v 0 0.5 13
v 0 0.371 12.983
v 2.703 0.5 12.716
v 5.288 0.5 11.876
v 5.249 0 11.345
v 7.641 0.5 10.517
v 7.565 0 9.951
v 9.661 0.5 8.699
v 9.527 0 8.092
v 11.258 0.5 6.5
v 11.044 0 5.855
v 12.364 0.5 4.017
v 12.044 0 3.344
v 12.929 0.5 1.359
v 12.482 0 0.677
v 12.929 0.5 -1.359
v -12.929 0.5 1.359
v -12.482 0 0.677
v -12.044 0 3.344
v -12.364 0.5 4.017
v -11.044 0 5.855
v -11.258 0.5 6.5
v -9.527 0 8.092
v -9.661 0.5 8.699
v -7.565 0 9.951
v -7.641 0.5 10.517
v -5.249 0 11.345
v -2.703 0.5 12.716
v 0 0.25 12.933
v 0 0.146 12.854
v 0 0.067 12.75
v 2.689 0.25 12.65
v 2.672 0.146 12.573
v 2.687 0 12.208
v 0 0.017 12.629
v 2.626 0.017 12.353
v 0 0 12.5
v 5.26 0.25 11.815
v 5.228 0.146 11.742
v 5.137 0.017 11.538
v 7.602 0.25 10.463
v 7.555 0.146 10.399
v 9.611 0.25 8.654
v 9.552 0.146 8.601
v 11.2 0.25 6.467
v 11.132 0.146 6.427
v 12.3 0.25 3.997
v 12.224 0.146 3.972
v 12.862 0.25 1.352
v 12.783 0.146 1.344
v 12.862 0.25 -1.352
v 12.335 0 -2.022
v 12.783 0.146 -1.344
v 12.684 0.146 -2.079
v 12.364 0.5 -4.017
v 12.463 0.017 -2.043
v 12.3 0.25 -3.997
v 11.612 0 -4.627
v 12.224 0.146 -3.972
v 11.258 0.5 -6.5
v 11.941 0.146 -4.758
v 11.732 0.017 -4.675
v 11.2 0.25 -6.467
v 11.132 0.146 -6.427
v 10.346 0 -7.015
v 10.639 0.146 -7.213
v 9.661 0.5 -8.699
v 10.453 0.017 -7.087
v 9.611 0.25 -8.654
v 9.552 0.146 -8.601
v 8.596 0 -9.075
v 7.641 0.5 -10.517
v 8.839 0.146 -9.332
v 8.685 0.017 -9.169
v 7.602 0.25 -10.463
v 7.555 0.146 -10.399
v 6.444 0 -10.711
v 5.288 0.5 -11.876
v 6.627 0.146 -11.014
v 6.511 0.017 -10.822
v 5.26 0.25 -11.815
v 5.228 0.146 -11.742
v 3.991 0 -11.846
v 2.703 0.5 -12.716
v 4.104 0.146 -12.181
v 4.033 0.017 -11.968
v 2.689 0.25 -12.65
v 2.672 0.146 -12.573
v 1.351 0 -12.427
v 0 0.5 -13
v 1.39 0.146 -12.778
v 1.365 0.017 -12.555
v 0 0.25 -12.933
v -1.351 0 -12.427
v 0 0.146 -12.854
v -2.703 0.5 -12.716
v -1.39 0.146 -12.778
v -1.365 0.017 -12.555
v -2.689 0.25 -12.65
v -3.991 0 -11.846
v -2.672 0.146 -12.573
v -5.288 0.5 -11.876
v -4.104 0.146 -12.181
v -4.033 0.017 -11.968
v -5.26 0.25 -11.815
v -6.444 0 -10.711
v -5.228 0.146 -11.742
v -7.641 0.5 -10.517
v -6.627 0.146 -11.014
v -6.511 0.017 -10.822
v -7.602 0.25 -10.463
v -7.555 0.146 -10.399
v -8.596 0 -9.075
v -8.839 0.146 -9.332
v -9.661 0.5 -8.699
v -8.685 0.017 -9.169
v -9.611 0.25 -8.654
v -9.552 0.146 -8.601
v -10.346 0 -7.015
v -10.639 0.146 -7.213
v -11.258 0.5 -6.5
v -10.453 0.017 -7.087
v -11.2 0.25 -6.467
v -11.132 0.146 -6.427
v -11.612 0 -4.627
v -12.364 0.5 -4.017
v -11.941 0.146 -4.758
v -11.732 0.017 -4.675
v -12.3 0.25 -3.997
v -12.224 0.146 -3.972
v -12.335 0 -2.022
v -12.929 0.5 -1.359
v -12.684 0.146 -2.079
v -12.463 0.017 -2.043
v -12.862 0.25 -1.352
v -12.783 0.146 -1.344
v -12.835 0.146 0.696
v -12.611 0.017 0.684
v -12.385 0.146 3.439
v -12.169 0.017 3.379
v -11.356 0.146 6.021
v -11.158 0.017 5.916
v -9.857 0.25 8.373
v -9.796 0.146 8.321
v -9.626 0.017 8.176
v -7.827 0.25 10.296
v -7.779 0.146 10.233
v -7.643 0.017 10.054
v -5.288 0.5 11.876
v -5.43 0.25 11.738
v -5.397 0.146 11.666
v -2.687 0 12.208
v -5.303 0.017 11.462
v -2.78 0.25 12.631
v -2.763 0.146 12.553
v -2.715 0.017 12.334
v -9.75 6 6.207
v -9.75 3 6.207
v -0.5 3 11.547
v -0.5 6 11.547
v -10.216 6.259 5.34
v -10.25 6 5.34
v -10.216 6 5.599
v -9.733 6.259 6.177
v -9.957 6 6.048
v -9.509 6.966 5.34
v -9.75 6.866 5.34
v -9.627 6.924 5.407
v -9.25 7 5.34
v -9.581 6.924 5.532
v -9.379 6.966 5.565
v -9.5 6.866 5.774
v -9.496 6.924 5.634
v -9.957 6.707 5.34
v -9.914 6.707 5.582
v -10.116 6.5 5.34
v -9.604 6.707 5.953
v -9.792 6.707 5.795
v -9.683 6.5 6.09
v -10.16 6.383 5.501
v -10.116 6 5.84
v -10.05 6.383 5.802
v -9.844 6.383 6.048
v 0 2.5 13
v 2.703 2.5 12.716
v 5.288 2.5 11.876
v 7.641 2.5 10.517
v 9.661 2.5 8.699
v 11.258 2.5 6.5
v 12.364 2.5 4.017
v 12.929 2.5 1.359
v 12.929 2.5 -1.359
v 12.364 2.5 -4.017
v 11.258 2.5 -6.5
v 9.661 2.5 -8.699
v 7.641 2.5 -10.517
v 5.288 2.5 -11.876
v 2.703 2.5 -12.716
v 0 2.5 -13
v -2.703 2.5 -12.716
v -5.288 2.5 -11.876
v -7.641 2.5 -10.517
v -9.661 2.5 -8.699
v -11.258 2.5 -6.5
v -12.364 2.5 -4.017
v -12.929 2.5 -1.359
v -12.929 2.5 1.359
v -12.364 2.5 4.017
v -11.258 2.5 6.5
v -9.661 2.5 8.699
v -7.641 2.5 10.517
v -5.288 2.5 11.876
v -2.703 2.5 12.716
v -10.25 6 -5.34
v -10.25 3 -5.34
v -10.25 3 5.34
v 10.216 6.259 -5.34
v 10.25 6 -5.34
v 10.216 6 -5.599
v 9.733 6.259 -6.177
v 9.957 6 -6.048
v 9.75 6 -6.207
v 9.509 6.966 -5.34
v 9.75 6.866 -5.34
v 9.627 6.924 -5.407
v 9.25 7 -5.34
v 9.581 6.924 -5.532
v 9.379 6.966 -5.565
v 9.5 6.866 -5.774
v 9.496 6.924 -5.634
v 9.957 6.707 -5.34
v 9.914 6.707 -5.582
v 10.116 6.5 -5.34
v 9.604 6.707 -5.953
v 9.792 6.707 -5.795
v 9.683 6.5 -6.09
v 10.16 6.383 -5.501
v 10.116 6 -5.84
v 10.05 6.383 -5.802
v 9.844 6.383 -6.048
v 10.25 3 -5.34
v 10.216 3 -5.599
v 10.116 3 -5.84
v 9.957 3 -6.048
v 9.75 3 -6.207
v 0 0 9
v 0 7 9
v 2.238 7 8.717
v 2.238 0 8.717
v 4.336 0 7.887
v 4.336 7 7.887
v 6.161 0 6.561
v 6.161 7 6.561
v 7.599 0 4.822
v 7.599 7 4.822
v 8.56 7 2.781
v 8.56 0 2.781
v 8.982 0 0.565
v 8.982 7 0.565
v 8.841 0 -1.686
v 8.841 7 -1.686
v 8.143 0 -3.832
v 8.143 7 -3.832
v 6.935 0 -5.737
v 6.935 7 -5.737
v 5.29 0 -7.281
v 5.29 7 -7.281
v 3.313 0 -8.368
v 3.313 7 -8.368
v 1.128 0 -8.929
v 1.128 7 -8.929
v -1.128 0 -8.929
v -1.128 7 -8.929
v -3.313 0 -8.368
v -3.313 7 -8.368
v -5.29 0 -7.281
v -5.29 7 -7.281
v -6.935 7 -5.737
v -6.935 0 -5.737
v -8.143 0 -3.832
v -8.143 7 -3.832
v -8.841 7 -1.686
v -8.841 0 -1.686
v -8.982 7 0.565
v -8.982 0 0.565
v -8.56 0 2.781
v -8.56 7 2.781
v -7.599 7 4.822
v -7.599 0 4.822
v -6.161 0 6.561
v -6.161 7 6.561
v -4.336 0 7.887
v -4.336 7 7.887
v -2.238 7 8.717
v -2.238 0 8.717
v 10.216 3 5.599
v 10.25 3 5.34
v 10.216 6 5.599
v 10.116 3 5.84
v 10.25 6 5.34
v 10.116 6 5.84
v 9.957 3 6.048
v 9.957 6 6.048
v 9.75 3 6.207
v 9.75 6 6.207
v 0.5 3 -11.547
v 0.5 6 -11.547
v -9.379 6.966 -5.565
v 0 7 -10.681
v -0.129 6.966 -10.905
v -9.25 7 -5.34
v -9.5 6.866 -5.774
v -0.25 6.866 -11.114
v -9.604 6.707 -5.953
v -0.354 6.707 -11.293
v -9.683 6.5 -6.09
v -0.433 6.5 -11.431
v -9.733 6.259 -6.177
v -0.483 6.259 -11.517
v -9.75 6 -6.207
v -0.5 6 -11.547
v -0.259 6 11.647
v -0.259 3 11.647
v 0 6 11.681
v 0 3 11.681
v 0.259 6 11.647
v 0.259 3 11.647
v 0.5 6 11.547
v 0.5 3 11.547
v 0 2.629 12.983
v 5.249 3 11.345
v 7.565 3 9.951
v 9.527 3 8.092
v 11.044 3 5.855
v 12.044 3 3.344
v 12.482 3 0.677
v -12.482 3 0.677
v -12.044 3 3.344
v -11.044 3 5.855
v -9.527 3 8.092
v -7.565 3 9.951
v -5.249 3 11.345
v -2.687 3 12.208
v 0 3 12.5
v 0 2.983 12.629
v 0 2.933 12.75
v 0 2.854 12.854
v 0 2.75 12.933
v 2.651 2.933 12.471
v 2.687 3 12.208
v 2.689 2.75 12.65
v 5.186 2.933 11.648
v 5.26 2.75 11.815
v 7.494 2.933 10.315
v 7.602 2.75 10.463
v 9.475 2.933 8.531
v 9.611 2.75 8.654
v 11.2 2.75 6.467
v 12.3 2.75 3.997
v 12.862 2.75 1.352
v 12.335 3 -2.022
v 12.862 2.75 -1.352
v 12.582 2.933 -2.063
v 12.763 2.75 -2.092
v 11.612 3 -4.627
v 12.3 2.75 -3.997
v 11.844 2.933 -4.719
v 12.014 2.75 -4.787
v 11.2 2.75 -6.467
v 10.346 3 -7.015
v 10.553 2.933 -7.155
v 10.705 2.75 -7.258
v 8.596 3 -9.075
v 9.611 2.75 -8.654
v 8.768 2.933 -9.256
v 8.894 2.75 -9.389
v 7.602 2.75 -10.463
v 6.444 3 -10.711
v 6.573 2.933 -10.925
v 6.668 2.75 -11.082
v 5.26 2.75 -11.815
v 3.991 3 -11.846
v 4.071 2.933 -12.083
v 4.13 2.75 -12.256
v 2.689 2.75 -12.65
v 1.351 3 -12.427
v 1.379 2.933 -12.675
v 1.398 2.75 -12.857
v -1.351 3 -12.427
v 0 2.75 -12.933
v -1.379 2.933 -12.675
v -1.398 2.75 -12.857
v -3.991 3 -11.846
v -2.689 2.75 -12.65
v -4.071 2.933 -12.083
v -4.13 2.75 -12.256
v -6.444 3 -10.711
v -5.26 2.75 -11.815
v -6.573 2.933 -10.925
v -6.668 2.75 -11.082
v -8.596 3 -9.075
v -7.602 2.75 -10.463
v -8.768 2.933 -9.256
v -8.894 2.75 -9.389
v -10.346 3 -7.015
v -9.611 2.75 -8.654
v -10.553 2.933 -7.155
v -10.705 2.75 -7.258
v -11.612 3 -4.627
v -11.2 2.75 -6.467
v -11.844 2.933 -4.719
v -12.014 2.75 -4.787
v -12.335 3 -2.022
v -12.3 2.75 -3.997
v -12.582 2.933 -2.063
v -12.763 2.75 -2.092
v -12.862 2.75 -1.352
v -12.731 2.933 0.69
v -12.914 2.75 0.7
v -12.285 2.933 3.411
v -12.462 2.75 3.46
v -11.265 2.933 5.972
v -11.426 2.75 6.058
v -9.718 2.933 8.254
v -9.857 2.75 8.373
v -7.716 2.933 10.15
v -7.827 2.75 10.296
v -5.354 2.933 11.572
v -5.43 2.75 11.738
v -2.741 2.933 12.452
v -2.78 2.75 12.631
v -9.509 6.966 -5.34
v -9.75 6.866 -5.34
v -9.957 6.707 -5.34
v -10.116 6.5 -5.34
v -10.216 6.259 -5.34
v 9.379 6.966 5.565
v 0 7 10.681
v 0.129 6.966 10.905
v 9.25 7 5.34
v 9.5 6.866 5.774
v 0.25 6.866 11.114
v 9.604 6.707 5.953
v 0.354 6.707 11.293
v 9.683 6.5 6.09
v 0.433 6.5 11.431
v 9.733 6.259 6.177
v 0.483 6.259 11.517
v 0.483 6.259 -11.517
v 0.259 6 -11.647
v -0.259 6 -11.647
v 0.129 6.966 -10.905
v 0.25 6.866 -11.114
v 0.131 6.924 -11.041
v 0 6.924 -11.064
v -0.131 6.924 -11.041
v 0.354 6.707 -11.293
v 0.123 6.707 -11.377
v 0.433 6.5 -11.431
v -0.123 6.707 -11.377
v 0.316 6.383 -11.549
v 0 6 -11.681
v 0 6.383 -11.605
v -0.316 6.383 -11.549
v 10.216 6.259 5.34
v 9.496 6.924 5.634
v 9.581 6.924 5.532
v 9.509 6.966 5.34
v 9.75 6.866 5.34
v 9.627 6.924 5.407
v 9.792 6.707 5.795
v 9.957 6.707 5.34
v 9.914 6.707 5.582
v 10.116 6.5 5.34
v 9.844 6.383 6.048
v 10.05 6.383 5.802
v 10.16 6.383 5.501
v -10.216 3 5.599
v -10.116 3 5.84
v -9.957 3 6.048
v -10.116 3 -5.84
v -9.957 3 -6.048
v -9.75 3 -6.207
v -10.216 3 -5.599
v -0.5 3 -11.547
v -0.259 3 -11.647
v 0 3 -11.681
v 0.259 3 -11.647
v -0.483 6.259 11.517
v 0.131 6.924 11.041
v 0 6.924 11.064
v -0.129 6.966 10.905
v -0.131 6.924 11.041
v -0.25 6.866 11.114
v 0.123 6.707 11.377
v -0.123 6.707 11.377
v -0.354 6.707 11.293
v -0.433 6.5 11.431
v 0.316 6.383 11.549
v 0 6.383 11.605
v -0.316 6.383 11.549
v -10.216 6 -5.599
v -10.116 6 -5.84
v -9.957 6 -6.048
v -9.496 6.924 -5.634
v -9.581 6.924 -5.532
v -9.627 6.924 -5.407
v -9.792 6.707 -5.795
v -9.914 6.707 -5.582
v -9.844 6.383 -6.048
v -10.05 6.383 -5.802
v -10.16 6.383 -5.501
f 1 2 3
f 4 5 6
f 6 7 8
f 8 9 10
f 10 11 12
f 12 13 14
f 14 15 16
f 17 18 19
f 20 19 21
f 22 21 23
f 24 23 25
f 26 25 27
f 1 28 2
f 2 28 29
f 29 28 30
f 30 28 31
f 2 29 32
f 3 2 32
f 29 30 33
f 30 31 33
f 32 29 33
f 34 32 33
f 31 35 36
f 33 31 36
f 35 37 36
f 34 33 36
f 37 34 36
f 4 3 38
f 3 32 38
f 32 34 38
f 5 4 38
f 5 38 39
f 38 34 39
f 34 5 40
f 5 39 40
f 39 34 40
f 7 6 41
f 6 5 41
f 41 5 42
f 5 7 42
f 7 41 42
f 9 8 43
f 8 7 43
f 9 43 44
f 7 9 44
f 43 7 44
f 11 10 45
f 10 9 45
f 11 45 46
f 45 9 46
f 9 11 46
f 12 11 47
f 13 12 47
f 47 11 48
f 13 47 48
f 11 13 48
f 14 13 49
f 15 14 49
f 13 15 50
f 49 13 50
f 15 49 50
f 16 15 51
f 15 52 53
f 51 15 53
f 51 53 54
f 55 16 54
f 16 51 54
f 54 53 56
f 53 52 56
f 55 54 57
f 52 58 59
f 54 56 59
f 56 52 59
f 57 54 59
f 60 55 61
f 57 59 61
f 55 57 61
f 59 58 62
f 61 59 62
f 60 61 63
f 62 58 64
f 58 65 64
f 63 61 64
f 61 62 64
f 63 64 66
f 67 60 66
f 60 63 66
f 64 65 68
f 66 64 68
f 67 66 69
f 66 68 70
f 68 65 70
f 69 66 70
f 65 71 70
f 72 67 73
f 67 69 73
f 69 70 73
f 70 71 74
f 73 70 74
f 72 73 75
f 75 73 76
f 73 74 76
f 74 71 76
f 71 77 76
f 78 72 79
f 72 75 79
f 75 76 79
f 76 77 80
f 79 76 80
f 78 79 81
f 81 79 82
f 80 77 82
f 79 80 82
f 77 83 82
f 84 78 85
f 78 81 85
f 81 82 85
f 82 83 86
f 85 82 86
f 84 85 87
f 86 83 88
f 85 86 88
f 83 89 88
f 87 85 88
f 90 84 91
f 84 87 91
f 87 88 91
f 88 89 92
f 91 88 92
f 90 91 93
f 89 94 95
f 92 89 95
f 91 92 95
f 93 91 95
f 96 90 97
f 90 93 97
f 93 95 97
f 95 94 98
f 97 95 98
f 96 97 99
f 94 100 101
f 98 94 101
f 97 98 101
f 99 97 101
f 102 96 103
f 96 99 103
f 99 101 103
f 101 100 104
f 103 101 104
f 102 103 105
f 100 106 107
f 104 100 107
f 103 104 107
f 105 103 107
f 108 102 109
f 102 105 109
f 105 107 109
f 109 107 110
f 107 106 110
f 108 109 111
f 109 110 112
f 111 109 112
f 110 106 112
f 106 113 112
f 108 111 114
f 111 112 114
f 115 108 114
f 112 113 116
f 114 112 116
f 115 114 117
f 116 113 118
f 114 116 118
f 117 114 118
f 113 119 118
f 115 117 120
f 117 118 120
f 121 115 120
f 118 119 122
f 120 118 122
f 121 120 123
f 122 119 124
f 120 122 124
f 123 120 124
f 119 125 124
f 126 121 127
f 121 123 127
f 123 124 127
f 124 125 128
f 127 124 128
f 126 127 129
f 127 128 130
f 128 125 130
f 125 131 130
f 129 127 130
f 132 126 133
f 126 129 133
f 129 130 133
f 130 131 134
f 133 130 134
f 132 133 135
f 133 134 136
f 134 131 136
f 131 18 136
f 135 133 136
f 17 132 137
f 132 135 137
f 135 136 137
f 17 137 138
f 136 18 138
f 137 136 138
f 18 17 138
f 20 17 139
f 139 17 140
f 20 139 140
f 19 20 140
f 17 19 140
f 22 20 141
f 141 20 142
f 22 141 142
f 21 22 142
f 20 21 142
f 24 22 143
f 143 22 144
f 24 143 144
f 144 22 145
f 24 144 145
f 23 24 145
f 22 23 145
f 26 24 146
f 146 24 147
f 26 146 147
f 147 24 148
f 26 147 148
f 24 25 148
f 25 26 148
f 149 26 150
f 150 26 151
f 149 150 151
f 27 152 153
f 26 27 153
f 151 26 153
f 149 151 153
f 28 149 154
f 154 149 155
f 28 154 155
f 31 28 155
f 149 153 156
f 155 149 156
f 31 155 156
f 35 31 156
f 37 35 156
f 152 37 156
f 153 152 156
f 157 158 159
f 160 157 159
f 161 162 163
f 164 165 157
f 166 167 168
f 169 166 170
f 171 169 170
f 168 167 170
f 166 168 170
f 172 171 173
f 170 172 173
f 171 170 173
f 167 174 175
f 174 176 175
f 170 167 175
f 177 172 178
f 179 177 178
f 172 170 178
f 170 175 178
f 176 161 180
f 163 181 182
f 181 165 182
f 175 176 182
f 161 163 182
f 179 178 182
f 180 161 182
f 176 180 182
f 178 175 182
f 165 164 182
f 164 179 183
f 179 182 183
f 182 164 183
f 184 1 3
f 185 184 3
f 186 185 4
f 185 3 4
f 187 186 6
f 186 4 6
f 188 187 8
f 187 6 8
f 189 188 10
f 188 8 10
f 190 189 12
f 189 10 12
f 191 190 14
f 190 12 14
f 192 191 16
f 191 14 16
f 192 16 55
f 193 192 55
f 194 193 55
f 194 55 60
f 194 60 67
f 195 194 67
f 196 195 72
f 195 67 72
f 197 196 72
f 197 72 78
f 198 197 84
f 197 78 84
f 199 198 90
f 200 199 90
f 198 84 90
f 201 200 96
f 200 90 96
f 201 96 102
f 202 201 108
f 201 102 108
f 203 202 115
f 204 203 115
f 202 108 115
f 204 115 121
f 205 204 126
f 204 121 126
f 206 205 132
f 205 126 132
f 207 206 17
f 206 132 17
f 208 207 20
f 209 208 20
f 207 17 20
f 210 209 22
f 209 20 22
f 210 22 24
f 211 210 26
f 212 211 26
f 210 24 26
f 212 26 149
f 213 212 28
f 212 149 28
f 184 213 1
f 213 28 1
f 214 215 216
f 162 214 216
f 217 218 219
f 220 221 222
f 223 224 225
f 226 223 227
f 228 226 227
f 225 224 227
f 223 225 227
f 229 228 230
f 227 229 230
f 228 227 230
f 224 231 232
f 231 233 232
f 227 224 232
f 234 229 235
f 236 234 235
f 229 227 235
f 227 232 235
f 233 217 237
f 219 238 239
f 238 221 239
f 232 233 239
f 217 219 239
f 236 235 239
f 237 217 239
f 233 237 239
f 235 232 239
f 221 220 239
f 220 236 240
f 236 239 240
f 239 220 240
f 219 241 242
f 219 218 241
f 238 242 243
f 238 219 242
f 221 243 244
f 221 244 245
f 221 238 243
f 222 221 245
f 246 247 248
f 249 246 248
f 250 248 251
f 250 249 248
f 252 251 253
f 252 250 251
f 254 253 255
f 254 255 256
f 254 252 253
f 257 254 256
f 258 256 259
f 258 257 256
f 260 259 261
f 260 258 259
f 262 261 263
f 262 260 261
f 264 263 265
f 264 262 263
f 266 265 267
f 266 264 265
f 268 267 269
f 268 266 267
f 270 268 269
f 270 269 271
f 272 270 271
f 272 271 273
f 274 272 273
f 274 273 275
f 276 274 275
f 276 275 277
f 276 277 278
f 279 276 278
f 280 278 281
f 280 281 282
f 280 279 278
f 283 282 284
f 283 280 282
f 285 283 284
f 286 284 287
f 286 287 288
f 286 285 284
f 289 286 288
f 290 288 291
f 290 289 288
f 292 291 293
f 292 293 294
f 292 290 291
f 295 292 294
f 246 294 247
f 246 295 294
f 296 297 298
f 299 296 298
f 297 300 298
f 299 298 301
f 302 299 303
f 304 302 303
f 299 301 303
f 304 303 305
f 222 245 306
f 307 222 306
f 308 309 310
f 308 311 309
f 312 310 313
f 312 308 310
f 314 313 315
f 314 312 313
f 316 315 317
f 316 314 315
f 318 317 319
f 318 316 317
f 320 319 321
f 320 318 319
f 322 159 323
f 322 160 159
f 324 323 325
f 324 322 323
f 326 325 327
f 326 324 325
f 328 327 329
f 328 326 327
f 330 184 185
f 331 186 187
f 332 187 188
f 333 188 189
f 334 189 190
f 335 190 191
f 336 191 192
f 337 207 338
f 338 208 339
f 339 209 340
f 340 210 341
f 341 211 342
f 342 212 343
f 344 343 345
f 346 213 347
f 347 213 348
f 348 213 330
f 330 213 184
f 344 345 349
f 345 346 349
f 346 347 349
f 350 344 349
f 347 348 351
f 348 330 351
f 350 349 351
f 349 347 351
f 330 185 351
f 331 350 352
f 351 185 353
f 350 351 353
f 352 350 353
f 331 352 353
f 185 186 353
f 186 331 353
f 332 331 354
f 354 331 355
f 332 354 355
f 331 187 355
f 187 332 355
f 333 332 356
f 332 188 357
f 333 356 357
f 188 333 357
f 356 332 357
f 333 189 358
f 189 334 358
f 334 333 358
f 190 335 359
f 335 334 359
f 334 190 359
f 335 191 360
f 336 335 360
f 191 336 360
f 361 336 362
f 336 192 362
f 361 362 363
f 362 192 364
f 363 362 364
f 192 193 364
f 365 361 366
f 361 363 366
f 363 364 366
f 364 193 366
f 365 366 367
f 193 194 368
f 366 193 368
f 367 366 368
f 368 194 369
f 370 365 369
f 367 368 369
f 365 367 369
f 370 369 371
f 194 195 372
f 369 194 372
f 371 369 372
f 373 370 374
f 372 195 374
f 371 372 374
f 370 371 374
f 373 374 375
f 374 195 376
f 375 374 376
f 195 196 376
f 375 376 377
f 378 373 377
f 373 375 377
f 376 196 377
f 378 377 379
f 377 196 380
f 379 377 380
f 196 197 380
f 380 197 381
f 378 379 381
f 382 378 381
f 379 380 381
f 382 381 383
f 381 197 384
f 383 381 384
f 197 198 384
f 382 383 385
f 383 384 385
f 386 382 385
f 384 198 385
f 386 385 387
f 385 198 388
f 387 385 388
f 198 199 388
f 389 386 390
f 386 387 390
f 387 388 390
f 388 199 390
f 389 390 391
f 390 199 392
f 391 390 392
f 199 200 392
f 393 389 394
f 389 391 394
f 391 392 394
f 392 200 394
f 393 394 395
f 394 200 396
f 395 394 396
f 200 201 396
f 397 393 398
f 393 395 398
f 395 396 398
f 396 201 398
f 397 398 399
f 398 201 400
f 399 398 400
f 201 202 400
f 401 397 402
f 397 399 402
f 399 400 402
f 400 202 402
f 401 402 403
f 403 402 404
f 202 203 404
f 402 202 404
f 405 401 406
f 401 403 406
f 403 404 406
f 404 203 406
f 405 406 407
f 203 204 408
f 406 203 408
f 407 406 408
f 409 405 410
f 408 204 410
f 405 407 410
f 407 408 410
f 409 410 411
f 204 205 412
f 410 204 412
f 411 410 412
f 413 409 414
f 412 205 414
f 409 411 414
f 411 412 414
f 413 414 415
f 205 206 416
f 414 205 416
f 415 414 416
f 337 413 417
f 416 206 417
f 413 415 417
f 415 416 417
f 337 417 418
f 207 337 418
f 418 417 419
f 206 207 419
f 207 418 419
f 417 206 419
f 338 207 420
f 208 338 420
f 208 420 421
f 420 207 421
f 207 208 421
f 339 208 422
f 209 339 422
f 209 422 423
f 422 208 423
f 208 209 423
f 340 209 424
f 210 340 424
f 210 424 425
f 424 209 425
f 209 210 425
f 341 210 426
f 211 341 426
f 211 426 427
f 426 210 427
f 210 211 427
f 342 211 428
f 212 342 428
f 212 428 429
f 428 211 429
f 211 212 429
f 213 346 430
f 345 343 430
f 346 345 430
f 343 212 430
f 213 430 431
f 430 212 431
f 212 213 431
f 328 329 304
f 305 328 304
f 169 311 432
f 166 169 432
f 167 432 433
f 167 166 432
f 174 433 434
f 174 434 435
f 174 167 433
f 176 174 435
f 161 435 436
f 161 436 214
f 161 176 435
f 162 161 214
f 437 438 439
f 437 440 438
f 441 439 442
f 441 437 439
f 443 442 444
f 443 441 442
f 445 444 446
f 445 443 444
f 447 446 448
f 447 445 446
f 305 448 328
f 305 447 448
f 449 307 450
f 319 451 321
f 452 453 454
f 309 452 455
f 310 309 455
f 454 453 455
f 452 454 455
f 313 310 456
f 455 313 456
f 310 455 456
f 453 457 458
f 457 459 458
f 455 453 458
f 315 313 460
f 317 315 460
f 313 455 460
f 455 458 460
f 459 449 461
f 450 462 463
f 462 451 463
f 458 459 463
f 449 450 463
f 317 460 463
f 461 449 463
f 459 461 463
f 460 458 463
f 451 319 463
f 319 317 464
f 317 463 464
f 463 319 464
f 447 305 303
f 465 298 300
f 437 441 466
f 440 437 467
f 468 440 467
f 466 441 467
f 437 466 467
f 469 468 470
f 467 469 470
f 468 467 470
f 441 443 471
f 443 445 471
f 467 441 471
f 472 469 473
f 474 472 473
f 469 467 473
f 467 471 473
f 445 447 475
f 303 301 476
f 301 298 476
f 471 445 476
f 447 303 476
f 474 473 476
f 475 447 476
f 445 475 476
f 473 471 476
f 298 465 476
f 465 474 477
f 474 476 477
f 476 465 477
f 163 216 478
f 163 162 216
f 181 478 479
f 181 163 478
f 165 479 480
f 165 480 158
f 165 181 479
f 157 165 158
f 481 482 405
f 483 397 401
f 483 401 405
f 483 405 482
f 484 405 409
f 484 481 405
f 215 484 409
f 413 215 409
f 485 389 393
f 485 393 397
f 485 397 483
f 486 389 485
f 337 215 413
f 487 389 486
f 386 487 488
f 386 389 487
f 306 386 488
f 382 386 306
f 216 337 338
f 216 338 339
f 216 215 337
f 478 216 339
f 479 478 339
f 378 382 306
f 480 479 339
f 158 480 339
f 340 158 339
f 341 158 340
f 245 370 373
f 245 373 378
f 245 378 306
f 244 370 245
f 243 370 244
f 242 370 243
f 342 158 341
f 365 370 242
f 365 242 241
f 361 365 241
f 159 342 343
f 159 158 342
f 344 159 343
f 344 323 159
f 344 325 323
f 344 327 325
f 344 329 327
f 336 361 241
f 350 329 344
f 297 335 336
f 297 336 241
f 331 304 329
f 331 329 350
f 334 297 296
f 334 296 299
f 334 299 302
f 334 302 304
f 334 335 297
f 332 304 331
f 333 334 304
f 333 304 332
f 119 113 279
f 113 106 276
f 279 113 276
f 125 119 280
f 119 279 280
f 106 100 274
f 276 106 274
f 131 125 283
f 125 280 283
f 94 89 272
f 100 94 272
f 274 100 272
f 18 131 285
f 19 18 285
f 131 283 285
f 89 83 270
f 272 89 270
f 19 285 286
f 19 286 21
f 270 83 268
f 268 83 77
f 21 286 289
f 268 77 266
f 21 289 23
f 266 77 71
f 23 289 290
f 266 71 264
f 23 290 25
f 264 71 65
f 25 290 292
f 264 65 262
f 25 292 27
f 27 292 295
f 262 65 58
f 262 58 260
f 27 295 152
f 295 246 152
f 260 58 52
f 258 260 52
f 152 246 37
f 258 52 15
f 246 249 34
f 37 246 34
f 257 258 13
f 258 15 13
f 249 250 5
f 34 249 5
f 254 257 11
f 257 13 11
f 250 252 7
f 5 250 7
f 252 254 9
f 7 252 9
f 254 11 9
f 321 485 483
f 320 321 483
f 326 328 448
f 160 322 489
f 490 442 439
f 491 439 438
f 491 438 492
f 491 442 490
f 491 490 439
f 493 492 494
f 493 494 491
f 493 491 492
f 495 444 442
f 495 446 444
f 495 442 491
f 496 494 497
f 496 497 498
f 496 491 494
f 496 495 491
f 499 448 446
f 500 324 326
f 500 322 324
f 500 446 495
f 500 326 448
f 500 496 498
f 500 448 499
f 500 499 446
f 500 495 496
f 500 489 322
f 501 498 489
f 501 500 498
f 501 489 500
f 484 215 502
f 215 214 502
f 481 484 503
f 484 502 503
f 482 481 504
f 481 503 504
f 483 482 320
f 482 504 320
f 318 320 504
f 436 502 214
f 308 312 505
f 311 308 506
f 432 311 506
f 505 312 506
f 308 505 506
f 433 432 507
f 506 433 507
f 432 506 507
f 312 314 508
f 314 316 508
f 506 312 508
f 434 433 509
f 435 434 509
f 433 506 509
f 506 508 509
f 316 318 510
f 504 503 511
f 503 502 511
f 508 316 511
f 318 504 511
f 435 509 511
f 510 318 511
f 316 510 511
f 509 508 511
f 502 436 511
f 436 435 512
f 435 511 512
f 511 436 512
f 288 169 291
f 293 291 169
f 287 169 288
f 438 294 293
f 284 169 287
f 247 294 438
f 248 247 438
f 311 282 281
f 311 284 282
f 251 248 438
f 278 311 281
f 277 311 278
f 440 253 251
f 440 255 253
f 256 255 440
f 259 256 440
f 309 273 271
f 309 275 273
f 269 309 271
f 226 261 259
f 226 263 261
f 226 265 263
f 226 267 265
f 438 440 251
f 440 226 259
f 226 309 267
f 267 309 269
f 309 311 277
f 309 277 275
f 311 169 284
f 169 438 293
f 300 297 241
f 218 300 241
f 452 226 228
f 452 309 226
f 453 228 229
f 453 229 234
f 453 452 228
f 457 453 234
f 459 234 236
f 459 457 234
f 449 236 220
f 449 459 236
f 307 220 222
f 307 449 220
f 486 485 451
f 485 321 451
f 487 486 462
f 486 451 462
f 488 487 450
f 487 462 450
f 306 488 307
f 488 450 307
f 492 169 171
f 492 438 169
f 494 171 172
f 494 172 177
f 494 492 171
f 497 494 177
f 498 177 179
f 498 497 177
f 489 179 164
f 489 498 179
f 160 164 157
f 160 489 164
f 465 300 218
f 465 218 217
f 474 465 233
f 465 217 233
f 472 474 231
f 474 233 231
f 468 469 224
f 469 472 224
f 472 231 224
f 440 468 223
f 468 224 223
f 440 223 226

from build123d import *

# Parameters (mm, degrees)
ESQUISSE1_R        = 13
ESQUISSE1_R_2      = 9
BOSS_EXTRU_1_DEPTH = 3
ESQUISSE2_R        = 9
BOSS_EXTRU_2_DEPTH = 4
CONG_2_R           = 1
CONG_3_R           = 0.5


with BuildPart() as part:
    # Esquisse1 → Boss.-Extru.1 (new body)
    with BuildSketch(Plane(origin=(0, 0, 0), x_dir=(1, 0, 0), z_dir=(0, 1, 0))):
        with Locations(Location((0, 0, 0), (0, 0, 270))):
            Circle(ESQUISSE1_R)
        with Locations(Location((0, 0, 0), (0, 0, 270))):
            Circle(ESQUISSE1_R_2, mode=Mode.SUBTRACT)
    extrude(amount=BOSS_EXTRU_1_DEPTH)

    # Esquisse2 → Boss.-Extru.2 (add)
    with BuildSketch(Plane(origin=(0, 3, 0), x_dir=(1, 0, 0), z_dir=(0, 1, 0))):
        Polygon((10.25, -5.917840259), (10.25, 5.917840259), (0, 11.835680518), (-10.25, 5.917840259), (-10.25, -5.917840259), (0, -11.835680518), align=None)
        with Locations(Location((0, 0, 0), (0, 0, 270))):
            Circle(ESQUISSE2_R, mode=Mode.SUBTRACT)
    extrude(amount=BOSS_EXTRU_2_DEPTH)

    # Congé2
    cong_2_edges = [part.edges().sort_by_distance(p)[0] for p in [
        (5.125, 7, 8.876760389),
        (10.25, 7, 0),
        (5.125, 7, -8.876760389),
        (-5.125, 7, -8.876760389),
        (-10.25, 7, 0),
        (-5.125, 7, 8.876760389),
        (0, 5, 11.835680518),
        (10.25, 5, 5.917840259),
        (10.25, 5, -5.917840259),
        (0, 5, -11.835680518),
        (-10.25, 5, -5.917840259),
        (-10.25, 5, 5.917840259),
    ]]
    fillet(cong_2_edges, radius=CONG_2_R)

    # Congé3
    cong_3_edges = [part.edges().sort_by_distance(p)[0] for p in [
        (0, 0, -13),
        (0, 3, -13),
    ]]
    fillet(cong_3_edges, radius=CONG_3_R)


solid = part.part
